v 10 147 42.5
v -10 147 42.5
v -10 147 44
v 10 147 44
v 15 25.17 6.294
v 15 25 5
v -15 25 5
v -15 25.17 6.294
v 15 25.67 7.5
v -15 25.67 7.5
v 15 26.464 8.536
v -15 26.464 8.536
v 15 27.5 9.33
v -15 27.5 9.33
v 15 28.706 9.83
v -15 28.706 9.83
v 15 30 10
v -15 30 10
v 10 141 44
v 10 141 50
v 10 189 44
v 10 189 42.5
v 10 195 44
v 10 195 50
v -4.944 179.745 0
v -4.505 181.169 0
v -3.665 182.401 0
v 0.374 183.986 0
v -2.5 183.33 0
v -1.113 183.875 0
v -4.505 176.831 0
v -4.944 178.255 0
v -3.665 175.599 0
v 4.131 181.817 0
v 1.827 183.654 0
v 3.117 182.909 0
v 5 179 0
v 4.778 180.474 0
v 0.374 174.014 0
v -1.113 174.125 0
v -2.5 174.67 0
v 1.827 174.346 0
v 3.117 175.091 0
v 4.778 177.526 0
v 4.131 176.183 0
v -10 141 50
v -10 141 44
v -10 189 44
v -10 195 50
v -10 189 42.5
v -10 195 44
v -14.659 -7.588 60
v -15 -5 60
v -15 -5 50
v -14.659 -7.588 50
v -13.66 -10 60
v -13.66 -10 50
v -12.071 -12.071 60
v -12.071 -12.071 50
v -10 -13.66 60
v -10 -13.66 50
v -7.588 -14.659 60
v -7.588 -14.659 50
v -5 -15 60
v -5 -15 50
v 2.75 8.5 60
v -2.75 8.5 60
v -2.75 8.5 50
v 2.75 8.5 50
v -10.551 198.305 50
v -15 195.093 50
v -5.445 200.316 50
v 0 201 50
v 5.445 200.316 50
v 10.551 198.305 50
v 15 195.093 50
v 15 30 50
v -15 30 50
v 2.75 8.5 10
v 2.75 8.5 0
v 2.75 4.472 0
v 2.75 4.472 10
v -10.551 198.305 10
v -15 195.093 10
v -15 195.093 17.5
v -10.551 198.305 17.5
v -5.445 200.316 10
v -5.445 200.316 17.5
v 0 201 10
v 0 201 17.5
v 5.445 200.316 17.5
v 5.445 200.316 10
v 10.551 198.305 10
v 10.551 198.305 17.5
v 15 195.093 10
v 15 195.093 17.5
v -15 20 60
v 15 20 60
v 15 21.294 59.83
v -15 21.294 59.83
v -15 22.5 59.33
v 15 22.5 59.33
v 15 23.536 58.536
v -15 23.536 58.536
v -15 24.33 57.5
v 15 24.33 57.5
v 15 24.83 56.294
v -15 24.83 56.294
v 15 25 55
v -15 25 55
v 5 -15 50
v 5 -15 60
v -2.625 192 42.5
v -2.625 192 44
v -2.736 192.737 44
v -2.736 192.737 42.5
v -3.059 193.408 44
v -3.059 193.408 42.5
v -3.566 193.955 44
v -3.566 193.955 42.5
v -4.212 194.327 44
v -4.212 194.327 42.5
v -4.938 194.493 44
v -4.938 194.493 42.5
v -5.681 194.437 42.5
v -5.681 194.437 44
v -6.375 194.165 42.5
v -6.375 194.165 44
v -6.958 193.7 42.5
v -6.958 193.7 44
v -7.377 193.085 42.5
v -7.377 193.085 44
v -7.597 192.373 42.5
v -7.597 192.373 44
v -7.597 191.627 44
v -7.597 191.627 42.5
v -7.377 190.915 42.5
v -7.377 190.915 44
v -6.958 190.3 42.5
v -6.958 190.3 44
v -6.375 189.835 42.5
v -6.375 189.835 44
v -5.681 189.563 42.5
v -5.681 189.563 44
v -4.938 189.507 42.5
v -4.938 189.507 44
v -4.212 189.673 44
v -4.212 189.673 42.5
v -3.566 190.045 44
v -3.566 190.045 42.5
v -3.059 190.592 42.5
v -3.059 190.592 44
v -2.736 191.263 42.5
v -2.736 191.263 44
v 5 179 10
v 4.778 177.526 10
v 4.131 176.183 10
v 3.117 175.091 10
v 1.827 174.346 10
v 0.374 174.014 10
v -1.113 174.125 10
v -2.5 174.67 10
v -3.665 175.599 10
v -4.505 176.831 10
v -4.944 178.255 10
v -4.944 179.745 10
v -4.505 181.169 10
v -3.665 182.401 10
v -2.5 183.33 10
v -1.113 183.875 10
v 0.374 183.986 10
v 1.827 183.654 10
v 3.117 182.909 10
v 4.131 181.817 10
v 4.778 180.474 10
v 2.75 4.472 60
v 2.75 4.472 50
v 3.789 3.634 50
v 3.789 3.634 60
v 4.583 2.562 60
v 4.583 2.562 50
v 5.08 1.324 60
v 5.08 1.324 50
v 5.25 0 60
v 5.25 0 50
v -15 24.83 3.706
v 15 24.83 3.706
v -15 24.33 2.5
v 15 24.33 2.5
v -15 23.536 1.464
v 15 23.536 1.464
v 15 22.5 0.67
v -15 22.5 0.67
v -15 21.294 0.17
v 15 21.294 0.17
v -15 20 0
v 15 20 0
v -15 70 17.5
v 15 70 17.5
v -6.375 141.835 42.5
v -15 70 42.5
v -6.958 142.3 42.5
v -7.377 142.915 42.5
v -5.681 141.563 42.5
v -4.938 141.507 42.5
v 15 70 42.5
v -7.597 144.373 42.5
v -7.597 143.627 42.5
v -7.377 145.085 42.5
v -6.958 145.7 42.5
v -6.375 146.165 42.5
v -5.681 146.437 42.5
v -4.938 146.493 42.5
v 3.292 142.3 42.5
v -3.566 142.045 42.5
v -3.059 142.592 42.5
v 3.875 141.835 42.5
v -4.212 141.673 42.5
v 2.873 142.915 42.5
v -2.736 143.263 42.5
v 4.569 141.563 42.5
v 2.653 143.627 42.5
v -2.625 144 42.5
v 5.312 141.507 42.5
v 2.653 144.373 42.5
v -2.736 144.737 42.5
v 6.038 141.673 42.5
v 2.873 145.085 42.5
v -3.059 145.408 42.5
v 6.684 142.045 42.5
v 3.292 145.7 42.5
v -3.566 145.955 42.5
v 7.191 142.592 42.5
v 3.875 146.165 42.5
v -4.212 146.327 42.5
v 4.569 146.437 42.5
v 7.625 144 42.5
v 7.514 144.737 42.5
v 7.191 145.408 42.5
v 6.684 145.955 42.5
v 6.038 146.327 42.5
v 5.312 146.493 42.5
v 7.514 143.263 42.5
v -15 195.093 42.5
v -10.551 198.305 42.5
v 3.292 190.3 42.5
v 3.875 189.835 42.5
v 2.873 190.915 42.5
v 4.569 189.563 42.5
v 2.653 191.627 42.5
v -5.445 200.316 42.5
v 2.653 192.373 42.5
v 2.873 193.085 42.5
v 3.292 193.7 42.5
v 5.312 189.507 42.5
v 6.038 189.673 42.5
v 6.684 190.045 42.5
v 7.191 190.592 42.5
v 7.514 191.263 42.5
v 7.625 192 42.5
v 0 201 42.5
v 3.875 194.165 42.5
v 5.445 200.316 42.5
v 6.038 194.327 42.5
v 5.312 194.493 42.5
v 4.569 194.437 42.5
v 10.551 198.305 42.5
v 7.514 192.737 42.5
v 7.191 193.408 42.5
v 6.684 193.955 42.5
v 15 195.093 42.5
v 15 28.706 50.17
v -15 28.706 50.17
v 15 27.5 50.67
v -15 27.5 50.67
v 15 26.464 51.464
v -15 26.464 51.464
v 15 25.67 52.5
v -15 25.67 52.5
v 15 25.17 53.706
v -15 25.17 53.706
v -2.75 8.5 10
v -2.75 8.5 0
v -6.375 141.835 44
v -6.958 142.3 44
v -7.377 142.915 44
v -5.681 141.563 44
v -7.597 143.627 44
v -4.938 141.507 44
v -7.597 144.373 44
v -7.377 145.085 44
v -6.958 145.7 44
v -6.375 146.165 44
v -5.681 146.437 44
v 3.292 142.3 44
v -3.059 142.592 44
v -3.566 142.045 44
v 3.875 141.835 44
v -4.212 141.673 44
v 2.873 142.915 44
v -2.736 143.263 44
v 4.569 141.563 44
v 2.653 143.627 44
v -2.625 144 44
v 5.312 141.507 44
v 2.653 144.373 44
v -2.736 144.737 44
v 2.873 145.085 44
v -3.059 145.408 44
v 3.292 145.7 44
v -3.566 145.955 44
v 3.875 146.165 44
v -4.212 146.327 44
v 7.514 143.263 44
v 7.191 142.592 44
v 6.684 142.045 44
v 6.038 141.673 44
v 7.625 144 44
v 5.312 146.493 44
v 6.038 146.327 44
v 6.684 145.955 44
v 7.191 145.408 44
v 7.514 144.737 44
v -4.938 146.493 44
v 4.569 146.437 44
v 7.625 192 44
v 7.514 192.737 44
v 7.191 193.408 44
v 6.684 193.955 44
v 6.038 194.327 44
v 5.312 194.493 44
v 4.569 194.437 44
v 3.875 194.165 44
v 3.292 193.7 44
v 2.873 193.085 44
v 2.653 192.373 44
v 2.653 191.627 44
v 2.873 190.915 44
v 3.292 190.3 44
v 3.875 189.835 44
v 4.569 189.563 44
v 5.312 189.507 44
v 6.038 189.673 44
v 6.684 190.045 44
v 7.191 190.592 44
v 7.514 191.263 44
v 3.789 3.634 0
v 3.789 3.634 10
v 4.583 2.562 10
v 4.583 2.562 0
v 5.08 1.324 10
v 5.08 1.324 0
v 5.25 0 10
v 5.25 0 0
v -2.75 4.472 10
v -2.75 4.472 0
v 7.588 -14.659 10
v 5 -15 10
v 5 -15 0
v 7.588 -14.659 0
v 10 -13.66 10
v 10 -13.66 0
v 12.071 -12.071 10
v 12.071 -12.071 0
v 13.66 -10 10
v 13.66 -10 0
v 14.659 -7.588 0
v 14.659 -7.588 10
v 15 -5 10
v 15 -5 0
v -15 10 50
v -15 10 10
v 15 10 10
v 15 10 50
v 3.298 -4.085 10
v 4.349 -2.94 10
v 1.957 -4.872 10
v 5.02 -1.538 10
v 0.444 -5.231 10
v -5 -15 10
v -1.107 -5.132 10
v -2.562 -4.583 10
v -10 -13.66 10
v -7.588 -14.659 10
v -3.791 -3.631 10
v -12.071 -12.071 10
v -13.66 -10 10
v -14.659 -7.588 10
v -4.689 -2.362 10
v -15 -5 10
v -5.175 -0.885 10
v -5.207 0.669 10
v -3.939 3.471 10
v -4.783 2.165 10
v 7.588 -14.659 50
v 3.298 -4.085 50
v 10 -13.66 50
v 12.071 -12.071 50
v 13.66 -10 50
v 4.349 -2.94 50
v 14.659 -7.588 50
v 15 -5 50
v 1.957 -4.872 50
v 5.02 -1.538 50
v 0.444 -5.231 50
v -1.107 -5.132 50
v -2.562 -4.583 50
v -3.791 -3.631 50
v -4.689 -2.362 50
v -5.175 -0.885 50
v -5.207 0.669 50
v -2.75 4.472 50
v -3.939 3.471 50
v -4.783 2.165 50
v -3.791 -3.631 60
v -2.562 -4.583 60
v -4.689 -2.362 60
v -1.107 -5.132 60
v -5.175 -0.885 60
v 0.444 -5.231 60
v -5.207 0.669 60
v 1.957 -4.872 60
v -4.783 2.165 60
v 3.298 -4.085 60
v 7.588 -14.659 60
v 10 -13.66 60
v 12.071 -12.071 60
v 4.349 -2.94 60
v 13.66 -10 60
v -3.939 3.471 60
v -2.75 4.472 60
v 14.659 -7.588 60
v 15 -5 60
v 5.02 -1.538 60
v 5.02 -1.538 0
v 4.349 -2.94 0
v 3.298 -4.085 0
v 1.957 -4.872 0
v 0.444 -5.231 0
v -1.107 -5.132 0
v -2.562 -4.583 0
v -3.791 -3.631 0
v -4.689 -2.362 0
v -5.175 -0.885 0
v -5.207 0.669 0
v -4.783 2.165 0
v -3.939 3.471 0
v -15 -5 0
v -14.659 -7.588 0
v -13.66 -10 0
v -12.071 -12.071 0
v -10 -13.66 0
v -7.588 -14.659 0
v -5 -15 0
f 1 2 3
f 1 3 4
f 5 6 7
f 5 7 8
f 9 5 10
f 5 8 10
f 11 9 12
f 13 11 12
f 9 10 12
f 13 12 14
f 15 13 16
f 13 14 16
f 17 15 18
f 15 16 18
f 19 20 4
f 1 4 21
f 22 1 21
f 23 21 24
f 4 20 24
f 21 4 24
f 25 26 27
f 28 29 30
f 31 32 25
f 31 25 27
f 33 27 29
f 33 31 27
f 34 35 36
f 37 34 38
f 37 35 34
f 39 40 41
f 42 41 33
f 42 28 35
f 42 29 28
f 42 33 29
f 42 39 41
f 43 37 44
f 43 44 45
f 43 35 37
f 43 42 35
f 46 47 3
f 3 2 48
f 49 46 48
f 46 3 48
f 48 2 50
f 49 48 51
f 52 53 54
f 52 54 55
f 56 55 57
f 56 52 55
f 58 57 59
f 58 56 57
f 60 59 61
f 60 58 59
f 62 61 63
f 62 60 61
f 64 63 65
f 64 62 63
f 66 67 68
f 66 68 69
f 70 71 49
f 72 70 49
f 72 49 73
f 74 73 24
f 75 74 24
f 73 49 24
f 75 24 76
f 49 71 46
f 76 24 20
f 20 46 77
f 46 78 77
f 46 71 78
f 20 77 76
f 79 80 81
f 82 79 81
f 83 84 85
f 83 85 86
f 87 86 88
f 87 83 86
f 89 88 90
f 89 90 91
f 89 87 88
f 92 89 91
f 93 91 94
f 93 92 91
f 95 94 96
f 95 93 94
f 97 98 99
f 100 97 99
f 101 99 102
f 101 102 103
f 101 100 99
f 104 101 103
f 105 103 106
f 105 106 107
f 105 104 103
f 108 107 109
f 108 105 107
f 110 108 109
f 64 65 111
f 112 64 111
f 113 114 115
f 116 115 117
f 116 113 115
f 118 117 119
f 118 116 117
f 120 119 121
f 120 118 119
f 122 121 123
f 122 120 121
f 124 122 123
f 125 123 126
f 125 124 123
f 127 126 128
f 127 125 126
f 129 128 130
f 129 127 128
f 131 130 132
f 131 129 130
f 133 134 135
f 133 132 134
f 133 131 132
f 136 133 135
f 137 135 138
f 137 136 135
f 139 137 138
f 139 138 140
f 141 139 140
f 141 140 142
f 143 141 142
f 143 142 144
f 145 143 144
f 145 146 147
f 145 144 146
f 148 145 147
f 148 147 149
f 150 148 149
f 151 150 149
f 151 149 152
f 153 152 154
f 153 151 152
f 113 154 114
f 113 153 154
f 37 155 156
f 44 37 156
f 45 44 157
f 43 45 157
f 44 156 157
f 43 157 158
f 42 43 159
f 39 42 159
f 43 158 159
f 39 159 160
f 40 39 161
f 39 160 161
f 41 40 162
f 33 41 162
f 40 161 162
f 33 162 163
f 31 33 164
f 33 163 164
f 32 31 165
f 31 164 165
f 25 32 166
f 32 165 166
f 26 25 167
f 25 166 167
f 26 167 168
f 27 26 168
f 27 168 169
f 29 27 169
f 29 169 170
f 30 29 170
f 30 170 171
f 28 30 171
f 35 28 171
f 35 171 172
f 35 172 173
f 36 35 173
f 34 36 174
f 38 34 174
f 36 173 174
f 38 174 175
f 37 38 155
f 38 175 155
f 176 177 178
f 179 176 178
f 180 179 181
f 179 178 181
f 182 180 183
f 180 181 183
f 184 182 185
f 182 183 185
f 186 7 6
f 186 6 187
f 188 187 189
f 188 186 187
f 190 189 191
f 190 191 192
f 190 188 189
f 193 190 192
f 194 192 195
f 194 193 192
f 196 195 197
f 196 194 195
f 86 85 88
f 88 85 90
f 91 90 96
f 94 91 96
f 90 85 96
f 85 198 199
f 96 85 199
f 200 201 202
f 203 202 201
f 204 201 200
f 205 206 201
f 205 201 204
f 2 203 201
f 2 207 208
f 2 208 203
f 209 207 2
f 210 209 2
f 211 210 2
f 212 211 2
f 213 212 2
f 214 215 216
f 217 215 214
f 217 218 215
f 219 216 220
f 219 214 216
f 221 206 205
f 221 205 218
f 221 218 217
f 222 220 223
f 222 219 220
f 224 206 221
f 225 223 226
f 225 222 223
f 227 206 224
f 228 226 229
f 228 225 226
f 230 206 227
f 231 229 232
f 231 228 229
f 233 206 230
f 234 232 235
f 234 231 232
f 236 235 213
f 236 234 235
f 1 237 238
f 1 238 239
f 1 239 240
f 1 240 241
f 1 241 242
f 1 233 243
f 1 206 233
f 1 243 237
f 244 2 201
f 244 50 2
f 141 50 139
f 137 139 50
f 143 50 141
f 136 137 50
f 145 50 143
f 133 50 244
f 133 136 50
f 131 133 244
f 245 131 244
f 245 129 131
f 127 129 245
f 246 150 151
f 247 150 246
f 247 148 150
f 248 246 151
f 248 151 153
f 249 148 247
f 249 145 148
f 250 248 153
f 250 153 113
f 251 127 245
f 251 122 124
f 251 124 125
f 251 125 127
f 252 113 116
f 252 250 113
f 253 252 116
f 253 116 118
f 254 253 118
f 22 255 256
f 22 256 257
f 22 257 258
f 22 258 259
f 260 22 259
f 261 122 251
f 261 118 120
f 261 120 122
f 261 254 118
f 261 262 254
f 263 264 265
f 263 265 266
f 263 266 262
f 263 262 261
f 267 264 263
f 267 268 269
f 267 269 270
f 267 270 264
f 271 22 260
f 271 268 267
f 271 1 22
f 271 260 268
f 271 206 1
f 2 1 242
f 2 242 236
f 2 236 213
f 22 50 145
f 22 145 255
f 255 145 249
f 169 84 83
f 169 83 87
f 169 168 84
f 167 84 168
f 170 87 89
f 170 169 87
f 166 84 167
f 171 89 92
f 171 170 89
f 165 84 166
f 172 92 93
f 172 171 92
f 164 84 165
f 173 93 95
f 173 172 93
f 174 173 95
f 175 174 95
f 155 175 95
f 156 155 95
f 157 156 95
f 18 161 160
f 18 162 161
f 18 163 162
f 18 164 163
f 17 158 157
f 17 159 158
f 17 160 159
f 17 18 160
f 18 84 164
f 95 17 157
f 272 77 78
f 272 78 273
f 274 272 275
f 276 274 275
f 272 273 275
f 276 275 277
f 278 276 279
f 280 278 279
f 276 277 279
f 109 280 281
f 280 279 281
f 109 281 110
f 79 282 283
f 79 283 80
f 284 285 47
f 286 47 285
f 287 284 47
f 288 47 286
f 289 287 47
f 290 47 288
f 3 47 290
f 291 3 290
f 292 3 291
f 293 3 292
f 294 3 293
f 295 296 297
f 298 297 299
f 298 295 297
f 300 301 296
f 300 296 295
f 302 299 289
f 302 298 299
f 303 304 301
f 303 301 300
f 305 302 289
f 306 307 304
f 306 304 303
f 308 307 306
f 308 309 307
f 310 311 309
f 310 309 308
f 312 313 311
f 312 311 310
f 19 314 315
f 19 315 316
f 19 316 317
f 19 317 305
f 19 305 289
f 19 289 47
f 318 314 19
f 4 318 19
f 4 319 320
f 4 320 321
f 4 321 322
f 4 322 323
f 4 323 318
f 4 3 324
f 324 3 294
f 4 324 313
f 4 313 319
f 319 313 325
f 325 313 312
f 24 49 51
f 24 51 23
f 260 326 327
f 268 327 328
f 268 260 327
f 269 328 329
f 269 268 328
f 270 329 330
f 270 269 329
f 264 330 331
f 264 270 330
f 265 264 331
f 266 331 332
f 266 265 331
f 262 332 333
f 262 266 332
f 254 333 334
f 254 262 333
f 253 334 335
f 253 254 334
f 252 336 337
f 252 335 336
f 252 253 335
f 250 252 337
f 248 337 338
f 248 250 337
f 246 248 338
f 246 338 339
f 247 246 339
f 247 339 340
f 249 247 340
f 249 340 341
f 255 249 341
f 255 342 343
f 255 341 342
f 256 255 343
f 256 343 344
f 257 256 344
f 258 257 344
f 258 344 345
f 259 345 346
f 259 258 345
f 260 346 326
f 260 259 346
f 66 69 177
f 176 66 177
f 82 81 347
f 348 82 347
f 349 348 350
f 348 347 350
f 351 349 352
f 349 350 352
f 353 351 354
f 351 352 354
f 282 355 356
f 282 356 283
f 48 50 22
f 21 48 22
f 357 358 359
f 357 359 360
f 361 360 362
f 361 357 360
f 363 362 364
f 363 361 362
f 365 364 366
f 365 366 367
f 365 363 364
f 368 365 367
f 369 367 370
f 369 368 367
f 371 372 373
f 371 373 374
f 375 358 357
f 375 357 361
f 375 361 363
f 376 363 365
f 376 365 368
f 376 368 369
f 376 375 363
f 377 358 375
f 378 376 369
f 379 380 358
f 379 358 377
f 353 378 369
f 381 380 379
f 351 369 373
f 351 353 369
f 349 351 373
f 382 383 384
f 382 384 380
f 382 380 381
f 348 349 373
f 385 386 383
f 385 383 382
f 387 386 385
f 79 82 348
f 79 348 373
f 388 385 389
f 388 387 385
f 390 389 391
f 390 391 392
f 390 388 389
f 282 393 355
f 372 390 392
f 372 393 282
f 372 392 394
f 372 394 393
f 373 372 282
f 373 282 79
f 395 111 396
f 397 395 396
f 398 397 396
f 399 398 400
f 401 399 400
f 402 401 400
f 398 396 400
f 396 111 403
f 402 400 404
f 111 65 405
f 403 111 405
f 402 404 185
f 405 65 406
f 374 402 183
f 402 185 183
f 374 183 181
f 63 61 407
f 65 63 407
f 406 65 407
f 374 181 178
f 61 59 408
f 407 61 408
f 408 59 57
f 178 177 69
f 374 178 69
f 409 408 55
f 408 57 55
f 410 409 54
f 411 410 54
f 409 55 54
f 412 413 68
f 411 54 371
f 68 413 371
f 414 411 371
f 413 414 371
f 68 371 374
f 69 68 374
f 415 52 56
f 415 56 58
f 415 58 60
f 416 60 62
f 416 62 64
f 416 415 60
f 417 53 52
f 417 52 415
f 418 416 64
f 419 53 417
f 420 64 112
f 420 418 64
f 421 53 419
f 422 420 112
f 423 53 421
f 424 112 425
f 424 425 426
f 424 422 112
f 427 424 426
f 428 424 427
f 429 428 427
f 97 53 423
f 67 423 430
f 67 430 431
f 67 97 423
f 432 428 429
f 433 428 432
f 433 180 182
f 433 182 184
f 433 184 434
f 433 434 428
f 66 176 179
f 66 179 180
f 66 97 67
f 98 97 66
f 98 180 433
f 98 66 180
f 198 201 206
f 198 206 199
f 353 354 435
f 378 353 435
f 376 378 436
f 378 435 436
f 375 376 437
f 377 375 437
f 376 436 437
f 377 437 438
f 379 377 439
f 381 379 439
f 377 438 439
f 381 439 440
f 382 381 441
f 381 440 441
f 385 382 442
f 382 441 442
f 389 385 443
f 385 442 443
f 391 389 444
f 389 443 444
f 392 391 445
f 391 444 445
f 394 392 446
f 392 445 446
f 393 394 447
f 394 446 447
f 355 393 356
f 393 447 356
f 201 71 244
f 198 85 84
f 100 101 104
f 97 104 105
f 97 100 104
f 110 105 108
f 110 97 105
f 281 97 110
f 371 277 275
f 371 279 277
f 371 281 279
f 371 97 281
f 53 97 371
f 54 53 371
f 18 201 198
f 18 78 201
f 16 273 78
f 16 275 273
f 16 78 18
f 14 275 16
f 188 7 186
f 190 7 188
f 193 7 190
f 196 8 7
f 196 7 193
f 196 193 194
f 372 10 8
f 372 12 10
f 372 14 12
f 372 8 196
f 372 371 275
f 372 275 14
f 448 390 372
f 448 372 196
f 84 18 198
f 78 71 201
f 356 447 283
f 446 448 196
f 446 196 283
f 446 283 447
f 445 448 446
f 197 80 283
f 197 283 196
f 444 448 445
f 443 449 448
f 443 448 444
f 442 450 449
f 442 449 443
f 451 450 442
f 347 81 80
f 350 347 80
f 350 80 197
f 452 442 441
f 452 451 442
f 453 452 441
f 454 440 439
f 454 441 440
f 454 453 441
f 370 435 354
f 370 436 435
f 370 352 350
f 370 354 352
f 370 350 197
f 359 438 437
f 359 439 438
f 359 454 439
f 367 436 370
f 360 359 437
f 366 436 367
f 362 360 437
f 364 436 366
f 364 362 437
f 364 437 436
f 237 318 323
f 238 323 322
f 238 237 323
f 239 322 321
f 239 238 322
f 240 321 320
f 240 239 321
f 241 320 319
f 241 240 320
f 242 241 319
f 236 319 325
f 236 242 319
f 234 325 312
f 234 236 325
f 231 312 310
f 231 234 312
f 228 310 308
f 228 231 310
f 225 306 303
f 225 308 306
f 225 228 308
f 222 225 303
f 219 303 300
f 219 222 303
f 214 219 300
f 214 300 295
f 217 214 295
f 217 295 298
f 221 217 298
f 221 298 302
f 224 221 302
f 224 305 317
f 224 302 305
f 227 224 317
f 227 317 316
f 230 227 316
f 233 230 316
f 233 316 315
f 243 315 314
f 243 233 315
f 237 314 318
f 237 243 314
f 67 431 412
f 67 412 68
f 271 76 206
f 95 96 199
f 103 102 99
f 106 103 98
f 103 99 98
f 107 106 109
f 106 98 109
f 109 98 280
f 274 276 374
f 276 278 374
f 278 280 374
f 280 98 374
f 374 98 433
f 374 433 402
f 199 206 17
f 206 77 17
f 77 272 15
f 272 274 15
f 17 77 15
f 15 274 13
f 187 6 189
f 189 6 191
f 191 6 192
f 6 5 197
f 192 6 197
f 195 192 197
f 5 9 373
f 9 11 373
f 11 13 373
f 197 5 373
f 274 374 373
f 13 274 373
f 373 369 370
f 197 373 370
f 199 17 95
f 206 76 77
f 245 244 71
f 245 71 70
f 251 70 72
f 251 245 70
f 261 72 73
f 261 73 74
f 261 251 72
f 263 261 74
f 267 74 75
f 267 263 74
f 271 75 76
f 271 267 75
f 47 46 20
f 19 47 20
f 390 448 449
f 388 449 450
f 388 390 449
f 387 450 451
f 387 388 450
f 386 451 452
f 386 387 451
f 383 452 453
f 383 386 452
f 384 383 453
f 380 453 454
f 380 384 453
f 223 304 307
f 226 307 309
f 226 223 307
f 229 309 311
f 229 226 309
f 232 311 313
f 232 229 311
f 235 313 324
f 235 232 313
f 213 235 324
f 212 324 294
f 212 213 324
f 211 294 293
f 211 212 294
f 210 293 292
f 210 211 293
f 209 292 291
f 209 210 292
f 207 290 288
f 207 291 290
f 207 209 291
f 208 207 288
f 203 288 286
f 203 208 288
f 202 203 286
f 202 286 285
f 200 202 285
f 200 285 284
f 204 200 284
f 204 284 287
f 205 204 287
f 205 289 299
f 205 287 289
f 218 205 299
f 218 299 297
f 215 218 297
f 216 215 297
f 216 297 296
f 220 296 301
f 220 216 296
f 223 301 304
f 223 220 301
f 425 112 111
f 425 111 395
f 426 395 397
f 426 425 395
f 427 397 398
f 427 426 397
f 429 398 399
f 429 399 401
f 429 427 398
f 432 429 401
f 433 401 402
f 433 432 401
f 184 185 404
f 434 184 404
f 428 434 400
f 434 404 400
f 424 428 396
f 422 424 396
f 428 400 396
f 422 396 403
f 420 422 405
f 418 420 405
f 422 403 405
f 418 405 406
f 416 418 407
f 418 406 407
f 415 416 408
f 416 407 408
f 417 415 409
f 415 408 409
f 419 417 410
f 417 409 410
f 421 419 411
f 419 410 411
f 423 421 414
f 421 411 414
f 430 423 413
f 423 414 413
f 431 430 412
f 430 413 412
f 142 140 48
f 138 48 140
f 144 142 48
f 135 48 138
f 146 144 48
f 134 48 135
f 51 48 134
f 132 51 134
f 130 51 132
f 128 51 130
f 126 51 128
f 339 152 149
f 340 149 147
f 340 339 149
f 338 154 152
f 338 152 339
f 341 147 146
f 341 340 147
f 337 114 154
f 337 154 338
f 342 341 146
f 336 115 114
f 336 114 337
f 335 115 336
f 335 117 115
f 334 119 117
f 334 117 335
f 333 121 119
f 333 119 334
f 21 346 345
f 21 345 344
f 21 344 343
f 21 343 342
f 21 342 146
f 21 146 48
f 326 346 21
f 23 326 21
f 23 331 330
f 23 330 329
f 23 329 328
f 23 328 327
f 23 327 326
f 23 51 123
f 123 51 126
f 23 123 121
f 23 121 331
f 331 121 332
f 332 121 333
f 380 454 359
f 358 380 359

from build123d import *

# Parameters (mm, degrees)
SKETCH2_W               = 30
SKETCH2_H               = 30
BOSS_EXTRUDE1_DEPTH     = 60
FILLET1_R               = 10
SKETCH3_W               = 40
SKETCH3_H               = 25
CUT_EXTRUDE1_DEPTH      = 69.738635424
SKETCH6_W               = 30
SKETCH6_H               = 40
BOSS_EXTRUDE2_DEPTH     = 125
SKETCH7_W               = 30
SKETCH7_H               = 10
BOSS_EXTRUDE3_DEPTH     = 10
FILLET2_START           = -16
FILLET2_DEPTH           = 32
FILLET2_START_2         = -15
FILLET2_2_DEPTH         = 30
SKETCH8_W               = 25
SKETCH8_H               = 70
CUT_EXTRUDE2_DEPTH      = 156.241746963
SKETCH12_W              = 30
SKETCH12_H              = 7.5
BOSS_EXTRUDE4_DEPTH     = 65
CUT_EXTRUDE3_DEPTH      = 212.541958013
CUT_EXTRUDE3_DEPTH_BACK = 7.5
SKETCH13_R              = 2.5
SKETCH13_W              = 20
SKETCH13_H              = 42
SKETCH14_W              = 20
SKETCH14_H              = 54
CUT_EXTRUDE4_DEPTH      = 6
SKETCH15_R              = 5
BOSS_EXTRUDE5_DEPTH     = 10
CUT_EXTRUDE5_REACH      = 213.542


with BuildPart() as part:
    # Sketch2 → Boss-Extrude1 (new body)
    with BuildSketch(Plane.XY):
        Rectangle(SKETCH2_W, SKETCH2_H)
        with BuildLine():
            ThreePointArc((5.25, 0), (-2.561737691, -4.582575695), (-2.75, 4.472135955))
            Line((-2.75, 4.472135955), (-2.75, 8.5))
            Line((-2.75, 8.5), (0, 8.5))
            Line((0, 8.5), (2.75, 8.5))
            Line((2.75, 8.5), (2.75, 4.472135955))
            ThreePointArc((2.75, 4.472135955), (4.582575695, 2.561737691), (5.25, 0))
        make_face(mode=Mode.SUBTRACT)
    extrude(amount=BOSS_EXTRUDE1_DEPTH)

    # Fillet1
    fillet1_edges = [part.edges().sort_by_distance(p)[0] for p in [
        (15, -15, 30),
        (-15, -15, 30),
    ]]
    fillet(fillet1_edges, radius=FILLET1_R)

    # Sketch3 → Cut-Extrude1 (cut, through all)
    with BuildSketch(Plane.ZY.offset(15)):
        with Locations((30, -2.5)):
            Rectangle(SKETCH3_W, SKETCH3_H)
    extrude(amount=-CUT_EXTRUDE1_DEPTH, mode=Mode.SUBTRACT)

    # Sketch6 → Boss-Extrude2 (add)
    with BuildSketch(Plane(origin=(0, 15, 0), x_dir=(1, 0, 0), z_dir=(0, 1, 0))):
        with Locations((0, -30)):
            Rectangle(SKETCH6_W, SKETCH6_H)
    extrude(amount=BOSS_EXTRUDE2_DEPTH)

    # Sketch7 → Boss-Extrude3 (add)
    with BuildSketch(Plane(origin=(0, 15, 0), x_dir=(1, 0, 0), z_dir=(0, 1, 0))):
        with Locations((0, -5)):
            Rectangle(SKETCH7_W, SKETCH7_H)
        with Locations((0, -55)):
            Rectangle(SKETCH7_W, SKETCH7_H)
    extrude(amount=BOSS_EXTRUDE3_DEPTH)

    # Fillet2: read off the stored shape, not the designer's step
    # Fillet2 outline → Fillet2 (cut)
    with BuildSketch(Plane.YZ.offset(FILLET2_START)):
        with BuildLine():
            ThreePointArc((25, 5), (23.535533906, 1.464466094), (20, 0))
            Line((20, 0), (25, 0))
            Line((25, 0), (25, 5))
        make_face()
        with BuildLine():
            Line((25, 60), (20, 60))
            ThreePointArc((20, 60), (23.535533906, 58.535533906), (25, 55))
            Line((25, 55), (25, 60))
        make_face()
    extrude(amount=FILLET2_DEPTH, mode=Mode.SUBTRACT)

    # Fillet2 2 outline → Fillet2 2 (add)
    with BuildSketch(Plane.YZ.offset(FILLET2_START_2)):
        with BuildLine():
            Line((25, 10), (25, 5))
            ThreePointArc((25, 5), (26.464466094, 8.535533906), (30, 10))
            Line((30, 10), (25, 10))
        make_face()
        with BuildLine():
            ThreePointArc((30, 50), (26.464466094, 51.464466094), (25, 55))
            Line((25, 55), (25, 50))
            Line((25, 50), (30, 50))
        make_face()
    extrude(amount=FILLET2_2_DEPTH)

    # Sketch8 → Cut-Extrude2 (cut, through all)
    with BuildSketch(Plane(origin=(15, 0, 0), x_dir=(0, 0, -1), z_dir=(1, 0, 0))):
        with Locations((-30, 105)):
            Rectangle(SKETCH8_W, SKETCH8_H)
    extrude(amount=-CUT_EXTRUDE2_DEPTH, mode=Mode.SUBTRACT)

    # Sketch12 → Boss-Extrude4 (add)
    with BuildSketch(Plane(origin=(0, 140, 0), x_dir=(1, 0, 0), z_dir=(0, 1, 0))):
        with Locations((0, -13.75)):
            Rectangle(SKETCH12_W, SKETCH12_H)
        with Locations((0, -46.25)):
            Rectangle(SKETCH12_W, SKETCH12_H)
    extrude(amount=BOSS_EXTRUDE4_DEPTH)

    # Sketch13 → Cut-Extrude3 (cut, two sides: drawn at the far end of the back side and taken through both)
    with BuildSketch(Plane.XY.offset(50).offset(-CUT_EXTRUDE3_DEPTH_BACK)):
        with Locations((-5.125, 192)):
            Circle(SKETCH13_R)
        with Locations((5.125, 192)):
            Circle(SKETCH13_R)
        with Locations((-5.125, 144)):
            Circle(SKETCH13_R)
        with Locations((5.125, 144)):
            Circle(SKETCH13_R)
        with Locations((0, 168)):
            Rectangle(SKETCH13_W, SKETCH13_H)
    extrude(amount=CUT_EXTRUDE3_DEPTH + CUT_EXTRUDE3_DEPTH_BACK, mode=Mode.SUBTRACT)

    # Sketch14 → Cut-Extrude4 (cut)
    with BuildSketch(Plane.XY.offset(50)):
        with Locations((0, 168)):
            Rectangle(SKETCH14_W, SKETCH14_H)
    extrude(amount=-CUT_EXTRUDE4_DEPTH, mode=Mode.SUBTRACT)

    # Sketch15 → Boss-Extrude5 (add)
    with BuildSketch(Plane(origin=(0, 0, 10), x_dir=(-1, 0, 0), z_dir=(0, 0, -1))):
        with Locations(Location((0, 179, 0), (0, 0, 180))):
            Circle(SKETCH15_R)
    extrude(amount=BOSS_EXTRUDE5_DEPTH)

    # Cut-Extrude5: up to this face of the body (flat: up to its plane)
    cut_extrude5_end = Plane(part.part.faces().sort_by_distance((0, 104.420863309, 50))[0])
    # Sketch18 → Cut-Extrude5 (cut, up to the picked face)
    with BuildSketch(Plane(origin=(0, 0, 10), x_dir=(-1, 0, 0), z_dir=(0, 0, -1)), mode=Mode.PRIVATE) as cut_extrude5_sk1:
        with BuildLine():
            Line((-15, 195.093476939), (-15, 205))
            Line((-15, 205), (15, 205))
            Line((15, 205), (15, 195.093476939))
            ThreePointArc((15, 195.093476939), (0, 201), (-15, 195.093476939))
        make_face()
    cut_extrude5_tool1 = split(extrude(cut_extrude5_sk1.sketch, amount=-CUT_EXTRUDE5_REACH, mode=Mode.PRIVATE), bisect_by=cut_extrude5_end, keep=Keep.BOTH, mode=Mode.PRIVATE)
    add(cut_extrude5_tool1.solids().sort_by(Axis((0, 201.823225, 10), (0, 0, 1)))[0], mode=Mode.SUBTRACT)


solid = part.part
